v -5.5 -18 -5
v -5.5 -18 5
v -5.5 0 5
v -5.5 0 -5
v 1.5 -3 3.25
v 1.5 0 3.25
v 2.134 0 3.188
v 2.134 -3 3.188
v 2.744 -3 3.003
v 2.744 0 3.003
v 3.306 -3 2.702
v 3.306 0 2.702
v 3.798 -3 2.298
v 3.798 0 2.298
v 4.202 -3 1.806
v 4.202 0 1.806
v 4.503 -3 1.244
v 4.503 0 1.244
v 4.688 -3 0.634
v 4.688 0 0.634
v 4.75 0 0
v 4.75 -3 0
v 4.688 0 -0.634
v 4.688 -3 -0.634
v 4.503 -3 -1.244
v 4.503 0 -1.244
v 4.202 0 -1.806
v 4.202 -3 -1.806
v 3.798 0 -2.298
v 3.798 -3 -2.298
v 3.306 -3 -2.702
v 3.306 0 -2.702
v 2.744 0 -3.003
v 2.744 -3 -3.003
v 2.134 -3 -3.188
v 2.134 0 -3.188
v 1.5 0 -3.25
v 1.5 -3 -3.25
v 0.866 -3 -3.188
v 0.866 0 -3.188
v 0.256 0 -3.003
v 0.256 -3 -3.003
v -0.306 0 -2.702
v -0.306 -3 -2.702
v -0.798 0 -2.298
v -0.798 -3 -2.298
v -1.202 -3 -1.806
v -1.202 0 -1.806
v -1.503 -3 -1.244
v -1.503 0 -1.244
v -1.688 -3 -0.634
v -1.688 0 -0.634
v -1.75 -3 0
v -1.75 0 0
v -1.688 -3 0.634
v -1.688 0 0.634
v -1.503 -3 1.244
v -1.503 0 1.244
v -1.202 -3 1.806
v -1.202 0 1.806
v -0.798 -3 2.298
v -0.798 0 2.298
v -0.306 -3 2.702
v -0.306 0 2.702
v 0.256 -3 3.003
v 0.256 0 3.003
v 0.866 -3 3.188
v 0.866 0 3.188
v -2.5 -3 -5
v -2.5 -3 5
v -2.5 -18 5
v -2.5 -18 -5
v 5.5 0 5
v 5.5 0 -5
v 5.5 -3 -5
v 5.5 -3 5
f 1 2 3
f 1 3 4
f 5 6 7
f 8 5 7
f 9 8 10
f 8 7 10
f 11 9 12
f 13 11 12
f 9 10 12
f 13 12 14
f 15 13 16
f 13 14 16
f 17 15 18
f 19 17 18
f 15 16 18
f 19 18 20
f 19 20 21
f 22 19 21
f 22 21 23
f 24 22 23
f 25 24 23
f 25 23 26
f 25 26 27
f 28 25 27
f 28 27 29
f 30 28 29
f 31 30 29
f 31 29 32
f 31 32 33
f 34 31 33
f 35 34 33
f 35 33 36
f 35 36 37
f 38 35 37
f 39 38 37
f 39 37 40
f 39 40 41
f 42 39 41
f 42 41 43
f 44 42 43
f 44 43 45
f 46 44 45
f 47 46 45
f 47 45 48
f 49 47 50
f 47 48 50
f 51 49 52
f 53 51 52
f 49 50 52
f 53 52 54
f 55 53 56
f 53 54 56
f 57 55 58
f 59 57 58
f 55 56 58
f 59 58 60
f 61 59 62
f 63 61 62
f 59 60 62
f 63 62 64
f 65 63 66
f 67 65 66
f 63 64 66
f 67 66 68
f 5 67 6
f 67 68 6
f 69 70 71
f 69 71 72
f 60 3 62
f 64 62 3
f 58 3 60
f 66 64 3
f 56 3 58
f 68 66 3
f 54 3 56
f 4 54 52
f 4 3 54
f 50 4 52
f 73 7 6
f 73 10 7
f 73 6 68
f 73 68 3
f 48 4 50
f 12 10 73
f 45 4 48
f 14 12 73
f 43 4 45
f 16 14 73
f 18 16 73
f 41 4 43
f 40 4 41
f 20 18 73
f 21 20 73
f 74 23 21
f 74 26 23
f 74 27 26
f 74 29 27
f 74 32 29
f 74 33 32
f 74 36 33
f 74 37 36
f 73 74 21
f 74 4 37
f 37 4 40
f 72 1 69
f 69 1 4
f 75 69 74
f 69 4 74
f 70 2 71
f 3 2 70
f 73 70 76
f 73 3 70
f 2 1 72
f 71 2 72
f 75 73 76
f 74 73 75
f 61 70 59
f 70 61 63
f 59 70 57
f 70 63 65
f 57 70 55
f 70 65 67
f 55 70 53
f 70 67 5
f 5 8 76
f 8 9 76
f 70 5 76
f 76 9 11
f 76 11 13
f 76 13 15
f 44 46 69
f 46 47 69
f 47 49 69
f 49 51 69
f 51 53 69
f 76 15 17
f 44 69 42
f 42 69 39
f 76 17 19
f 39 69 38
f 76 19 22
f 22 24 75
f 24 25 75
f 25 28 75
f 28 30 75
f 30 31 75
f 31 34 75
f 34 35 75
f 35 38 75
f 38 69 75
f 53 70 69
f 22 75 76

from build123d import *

# Parameters (mm, degrees)
SKETCH1_W           = 8
SKETCH1_H           = 10
SKETCH1_R           = 1.5
BOSS_EXTRUDE1_DEPTH = 3
SKETCH2_W           = 3
SKETCH2_H           = 10
BOSS_EXTRUDE2_DEPTH = 18
SKETCH3_R           = 3.25
CUT_EXTRUDE1_DEPTH  = 3.2


with BuildPart() as part:
    # Sketch1 → Boss-Extrude1 (new body)
    with BuildSketch(Plane(origin=(0, 0, 0), x_dir=(1, 0, 0), z_dir=(0, 1, 0))):
        with Locations((1.5, 0)):
            Rectangle(SKETCH1_W, SKETCH1_H)
        with Locations(Location((1.5, 0, 0), (0, 0, 270))):
            Circle(SKETCH1_R, mode=Mode.SUBTRACT)
    extrude(amount=-BOSS_EXTRUDE1_DEPTH)

    # Sketch2 → Boss-Extrude2 (add)
    with BuildSketch(Plane(origin=(0, 0, 0), x_dir=(1, 0, 0), z_dir=(0, 1, 0))):
        with Locations((-4, 0)):
            Rectangle(SKETCH2_W, SKETCH2_H)
    extrude(amount=-BOSS_EXTRUDE2_DEPTH)

    # Sketch3 → Cut-Extrude1 (cut)
    with BuildSketch(Plane(origin=(0, 0, 0), x_dir=(1, 0, 0), z_dir=(0, 1, 0))):
        with Locations(Location((1.5, 0, 0), (0, 0, 270))):
            Circle(SKETCH3_R)
    extrude(amount=-CUT_EXTRUDE1_DEPTH, mode=Mode.SUBTRACT)


solid = part.part
